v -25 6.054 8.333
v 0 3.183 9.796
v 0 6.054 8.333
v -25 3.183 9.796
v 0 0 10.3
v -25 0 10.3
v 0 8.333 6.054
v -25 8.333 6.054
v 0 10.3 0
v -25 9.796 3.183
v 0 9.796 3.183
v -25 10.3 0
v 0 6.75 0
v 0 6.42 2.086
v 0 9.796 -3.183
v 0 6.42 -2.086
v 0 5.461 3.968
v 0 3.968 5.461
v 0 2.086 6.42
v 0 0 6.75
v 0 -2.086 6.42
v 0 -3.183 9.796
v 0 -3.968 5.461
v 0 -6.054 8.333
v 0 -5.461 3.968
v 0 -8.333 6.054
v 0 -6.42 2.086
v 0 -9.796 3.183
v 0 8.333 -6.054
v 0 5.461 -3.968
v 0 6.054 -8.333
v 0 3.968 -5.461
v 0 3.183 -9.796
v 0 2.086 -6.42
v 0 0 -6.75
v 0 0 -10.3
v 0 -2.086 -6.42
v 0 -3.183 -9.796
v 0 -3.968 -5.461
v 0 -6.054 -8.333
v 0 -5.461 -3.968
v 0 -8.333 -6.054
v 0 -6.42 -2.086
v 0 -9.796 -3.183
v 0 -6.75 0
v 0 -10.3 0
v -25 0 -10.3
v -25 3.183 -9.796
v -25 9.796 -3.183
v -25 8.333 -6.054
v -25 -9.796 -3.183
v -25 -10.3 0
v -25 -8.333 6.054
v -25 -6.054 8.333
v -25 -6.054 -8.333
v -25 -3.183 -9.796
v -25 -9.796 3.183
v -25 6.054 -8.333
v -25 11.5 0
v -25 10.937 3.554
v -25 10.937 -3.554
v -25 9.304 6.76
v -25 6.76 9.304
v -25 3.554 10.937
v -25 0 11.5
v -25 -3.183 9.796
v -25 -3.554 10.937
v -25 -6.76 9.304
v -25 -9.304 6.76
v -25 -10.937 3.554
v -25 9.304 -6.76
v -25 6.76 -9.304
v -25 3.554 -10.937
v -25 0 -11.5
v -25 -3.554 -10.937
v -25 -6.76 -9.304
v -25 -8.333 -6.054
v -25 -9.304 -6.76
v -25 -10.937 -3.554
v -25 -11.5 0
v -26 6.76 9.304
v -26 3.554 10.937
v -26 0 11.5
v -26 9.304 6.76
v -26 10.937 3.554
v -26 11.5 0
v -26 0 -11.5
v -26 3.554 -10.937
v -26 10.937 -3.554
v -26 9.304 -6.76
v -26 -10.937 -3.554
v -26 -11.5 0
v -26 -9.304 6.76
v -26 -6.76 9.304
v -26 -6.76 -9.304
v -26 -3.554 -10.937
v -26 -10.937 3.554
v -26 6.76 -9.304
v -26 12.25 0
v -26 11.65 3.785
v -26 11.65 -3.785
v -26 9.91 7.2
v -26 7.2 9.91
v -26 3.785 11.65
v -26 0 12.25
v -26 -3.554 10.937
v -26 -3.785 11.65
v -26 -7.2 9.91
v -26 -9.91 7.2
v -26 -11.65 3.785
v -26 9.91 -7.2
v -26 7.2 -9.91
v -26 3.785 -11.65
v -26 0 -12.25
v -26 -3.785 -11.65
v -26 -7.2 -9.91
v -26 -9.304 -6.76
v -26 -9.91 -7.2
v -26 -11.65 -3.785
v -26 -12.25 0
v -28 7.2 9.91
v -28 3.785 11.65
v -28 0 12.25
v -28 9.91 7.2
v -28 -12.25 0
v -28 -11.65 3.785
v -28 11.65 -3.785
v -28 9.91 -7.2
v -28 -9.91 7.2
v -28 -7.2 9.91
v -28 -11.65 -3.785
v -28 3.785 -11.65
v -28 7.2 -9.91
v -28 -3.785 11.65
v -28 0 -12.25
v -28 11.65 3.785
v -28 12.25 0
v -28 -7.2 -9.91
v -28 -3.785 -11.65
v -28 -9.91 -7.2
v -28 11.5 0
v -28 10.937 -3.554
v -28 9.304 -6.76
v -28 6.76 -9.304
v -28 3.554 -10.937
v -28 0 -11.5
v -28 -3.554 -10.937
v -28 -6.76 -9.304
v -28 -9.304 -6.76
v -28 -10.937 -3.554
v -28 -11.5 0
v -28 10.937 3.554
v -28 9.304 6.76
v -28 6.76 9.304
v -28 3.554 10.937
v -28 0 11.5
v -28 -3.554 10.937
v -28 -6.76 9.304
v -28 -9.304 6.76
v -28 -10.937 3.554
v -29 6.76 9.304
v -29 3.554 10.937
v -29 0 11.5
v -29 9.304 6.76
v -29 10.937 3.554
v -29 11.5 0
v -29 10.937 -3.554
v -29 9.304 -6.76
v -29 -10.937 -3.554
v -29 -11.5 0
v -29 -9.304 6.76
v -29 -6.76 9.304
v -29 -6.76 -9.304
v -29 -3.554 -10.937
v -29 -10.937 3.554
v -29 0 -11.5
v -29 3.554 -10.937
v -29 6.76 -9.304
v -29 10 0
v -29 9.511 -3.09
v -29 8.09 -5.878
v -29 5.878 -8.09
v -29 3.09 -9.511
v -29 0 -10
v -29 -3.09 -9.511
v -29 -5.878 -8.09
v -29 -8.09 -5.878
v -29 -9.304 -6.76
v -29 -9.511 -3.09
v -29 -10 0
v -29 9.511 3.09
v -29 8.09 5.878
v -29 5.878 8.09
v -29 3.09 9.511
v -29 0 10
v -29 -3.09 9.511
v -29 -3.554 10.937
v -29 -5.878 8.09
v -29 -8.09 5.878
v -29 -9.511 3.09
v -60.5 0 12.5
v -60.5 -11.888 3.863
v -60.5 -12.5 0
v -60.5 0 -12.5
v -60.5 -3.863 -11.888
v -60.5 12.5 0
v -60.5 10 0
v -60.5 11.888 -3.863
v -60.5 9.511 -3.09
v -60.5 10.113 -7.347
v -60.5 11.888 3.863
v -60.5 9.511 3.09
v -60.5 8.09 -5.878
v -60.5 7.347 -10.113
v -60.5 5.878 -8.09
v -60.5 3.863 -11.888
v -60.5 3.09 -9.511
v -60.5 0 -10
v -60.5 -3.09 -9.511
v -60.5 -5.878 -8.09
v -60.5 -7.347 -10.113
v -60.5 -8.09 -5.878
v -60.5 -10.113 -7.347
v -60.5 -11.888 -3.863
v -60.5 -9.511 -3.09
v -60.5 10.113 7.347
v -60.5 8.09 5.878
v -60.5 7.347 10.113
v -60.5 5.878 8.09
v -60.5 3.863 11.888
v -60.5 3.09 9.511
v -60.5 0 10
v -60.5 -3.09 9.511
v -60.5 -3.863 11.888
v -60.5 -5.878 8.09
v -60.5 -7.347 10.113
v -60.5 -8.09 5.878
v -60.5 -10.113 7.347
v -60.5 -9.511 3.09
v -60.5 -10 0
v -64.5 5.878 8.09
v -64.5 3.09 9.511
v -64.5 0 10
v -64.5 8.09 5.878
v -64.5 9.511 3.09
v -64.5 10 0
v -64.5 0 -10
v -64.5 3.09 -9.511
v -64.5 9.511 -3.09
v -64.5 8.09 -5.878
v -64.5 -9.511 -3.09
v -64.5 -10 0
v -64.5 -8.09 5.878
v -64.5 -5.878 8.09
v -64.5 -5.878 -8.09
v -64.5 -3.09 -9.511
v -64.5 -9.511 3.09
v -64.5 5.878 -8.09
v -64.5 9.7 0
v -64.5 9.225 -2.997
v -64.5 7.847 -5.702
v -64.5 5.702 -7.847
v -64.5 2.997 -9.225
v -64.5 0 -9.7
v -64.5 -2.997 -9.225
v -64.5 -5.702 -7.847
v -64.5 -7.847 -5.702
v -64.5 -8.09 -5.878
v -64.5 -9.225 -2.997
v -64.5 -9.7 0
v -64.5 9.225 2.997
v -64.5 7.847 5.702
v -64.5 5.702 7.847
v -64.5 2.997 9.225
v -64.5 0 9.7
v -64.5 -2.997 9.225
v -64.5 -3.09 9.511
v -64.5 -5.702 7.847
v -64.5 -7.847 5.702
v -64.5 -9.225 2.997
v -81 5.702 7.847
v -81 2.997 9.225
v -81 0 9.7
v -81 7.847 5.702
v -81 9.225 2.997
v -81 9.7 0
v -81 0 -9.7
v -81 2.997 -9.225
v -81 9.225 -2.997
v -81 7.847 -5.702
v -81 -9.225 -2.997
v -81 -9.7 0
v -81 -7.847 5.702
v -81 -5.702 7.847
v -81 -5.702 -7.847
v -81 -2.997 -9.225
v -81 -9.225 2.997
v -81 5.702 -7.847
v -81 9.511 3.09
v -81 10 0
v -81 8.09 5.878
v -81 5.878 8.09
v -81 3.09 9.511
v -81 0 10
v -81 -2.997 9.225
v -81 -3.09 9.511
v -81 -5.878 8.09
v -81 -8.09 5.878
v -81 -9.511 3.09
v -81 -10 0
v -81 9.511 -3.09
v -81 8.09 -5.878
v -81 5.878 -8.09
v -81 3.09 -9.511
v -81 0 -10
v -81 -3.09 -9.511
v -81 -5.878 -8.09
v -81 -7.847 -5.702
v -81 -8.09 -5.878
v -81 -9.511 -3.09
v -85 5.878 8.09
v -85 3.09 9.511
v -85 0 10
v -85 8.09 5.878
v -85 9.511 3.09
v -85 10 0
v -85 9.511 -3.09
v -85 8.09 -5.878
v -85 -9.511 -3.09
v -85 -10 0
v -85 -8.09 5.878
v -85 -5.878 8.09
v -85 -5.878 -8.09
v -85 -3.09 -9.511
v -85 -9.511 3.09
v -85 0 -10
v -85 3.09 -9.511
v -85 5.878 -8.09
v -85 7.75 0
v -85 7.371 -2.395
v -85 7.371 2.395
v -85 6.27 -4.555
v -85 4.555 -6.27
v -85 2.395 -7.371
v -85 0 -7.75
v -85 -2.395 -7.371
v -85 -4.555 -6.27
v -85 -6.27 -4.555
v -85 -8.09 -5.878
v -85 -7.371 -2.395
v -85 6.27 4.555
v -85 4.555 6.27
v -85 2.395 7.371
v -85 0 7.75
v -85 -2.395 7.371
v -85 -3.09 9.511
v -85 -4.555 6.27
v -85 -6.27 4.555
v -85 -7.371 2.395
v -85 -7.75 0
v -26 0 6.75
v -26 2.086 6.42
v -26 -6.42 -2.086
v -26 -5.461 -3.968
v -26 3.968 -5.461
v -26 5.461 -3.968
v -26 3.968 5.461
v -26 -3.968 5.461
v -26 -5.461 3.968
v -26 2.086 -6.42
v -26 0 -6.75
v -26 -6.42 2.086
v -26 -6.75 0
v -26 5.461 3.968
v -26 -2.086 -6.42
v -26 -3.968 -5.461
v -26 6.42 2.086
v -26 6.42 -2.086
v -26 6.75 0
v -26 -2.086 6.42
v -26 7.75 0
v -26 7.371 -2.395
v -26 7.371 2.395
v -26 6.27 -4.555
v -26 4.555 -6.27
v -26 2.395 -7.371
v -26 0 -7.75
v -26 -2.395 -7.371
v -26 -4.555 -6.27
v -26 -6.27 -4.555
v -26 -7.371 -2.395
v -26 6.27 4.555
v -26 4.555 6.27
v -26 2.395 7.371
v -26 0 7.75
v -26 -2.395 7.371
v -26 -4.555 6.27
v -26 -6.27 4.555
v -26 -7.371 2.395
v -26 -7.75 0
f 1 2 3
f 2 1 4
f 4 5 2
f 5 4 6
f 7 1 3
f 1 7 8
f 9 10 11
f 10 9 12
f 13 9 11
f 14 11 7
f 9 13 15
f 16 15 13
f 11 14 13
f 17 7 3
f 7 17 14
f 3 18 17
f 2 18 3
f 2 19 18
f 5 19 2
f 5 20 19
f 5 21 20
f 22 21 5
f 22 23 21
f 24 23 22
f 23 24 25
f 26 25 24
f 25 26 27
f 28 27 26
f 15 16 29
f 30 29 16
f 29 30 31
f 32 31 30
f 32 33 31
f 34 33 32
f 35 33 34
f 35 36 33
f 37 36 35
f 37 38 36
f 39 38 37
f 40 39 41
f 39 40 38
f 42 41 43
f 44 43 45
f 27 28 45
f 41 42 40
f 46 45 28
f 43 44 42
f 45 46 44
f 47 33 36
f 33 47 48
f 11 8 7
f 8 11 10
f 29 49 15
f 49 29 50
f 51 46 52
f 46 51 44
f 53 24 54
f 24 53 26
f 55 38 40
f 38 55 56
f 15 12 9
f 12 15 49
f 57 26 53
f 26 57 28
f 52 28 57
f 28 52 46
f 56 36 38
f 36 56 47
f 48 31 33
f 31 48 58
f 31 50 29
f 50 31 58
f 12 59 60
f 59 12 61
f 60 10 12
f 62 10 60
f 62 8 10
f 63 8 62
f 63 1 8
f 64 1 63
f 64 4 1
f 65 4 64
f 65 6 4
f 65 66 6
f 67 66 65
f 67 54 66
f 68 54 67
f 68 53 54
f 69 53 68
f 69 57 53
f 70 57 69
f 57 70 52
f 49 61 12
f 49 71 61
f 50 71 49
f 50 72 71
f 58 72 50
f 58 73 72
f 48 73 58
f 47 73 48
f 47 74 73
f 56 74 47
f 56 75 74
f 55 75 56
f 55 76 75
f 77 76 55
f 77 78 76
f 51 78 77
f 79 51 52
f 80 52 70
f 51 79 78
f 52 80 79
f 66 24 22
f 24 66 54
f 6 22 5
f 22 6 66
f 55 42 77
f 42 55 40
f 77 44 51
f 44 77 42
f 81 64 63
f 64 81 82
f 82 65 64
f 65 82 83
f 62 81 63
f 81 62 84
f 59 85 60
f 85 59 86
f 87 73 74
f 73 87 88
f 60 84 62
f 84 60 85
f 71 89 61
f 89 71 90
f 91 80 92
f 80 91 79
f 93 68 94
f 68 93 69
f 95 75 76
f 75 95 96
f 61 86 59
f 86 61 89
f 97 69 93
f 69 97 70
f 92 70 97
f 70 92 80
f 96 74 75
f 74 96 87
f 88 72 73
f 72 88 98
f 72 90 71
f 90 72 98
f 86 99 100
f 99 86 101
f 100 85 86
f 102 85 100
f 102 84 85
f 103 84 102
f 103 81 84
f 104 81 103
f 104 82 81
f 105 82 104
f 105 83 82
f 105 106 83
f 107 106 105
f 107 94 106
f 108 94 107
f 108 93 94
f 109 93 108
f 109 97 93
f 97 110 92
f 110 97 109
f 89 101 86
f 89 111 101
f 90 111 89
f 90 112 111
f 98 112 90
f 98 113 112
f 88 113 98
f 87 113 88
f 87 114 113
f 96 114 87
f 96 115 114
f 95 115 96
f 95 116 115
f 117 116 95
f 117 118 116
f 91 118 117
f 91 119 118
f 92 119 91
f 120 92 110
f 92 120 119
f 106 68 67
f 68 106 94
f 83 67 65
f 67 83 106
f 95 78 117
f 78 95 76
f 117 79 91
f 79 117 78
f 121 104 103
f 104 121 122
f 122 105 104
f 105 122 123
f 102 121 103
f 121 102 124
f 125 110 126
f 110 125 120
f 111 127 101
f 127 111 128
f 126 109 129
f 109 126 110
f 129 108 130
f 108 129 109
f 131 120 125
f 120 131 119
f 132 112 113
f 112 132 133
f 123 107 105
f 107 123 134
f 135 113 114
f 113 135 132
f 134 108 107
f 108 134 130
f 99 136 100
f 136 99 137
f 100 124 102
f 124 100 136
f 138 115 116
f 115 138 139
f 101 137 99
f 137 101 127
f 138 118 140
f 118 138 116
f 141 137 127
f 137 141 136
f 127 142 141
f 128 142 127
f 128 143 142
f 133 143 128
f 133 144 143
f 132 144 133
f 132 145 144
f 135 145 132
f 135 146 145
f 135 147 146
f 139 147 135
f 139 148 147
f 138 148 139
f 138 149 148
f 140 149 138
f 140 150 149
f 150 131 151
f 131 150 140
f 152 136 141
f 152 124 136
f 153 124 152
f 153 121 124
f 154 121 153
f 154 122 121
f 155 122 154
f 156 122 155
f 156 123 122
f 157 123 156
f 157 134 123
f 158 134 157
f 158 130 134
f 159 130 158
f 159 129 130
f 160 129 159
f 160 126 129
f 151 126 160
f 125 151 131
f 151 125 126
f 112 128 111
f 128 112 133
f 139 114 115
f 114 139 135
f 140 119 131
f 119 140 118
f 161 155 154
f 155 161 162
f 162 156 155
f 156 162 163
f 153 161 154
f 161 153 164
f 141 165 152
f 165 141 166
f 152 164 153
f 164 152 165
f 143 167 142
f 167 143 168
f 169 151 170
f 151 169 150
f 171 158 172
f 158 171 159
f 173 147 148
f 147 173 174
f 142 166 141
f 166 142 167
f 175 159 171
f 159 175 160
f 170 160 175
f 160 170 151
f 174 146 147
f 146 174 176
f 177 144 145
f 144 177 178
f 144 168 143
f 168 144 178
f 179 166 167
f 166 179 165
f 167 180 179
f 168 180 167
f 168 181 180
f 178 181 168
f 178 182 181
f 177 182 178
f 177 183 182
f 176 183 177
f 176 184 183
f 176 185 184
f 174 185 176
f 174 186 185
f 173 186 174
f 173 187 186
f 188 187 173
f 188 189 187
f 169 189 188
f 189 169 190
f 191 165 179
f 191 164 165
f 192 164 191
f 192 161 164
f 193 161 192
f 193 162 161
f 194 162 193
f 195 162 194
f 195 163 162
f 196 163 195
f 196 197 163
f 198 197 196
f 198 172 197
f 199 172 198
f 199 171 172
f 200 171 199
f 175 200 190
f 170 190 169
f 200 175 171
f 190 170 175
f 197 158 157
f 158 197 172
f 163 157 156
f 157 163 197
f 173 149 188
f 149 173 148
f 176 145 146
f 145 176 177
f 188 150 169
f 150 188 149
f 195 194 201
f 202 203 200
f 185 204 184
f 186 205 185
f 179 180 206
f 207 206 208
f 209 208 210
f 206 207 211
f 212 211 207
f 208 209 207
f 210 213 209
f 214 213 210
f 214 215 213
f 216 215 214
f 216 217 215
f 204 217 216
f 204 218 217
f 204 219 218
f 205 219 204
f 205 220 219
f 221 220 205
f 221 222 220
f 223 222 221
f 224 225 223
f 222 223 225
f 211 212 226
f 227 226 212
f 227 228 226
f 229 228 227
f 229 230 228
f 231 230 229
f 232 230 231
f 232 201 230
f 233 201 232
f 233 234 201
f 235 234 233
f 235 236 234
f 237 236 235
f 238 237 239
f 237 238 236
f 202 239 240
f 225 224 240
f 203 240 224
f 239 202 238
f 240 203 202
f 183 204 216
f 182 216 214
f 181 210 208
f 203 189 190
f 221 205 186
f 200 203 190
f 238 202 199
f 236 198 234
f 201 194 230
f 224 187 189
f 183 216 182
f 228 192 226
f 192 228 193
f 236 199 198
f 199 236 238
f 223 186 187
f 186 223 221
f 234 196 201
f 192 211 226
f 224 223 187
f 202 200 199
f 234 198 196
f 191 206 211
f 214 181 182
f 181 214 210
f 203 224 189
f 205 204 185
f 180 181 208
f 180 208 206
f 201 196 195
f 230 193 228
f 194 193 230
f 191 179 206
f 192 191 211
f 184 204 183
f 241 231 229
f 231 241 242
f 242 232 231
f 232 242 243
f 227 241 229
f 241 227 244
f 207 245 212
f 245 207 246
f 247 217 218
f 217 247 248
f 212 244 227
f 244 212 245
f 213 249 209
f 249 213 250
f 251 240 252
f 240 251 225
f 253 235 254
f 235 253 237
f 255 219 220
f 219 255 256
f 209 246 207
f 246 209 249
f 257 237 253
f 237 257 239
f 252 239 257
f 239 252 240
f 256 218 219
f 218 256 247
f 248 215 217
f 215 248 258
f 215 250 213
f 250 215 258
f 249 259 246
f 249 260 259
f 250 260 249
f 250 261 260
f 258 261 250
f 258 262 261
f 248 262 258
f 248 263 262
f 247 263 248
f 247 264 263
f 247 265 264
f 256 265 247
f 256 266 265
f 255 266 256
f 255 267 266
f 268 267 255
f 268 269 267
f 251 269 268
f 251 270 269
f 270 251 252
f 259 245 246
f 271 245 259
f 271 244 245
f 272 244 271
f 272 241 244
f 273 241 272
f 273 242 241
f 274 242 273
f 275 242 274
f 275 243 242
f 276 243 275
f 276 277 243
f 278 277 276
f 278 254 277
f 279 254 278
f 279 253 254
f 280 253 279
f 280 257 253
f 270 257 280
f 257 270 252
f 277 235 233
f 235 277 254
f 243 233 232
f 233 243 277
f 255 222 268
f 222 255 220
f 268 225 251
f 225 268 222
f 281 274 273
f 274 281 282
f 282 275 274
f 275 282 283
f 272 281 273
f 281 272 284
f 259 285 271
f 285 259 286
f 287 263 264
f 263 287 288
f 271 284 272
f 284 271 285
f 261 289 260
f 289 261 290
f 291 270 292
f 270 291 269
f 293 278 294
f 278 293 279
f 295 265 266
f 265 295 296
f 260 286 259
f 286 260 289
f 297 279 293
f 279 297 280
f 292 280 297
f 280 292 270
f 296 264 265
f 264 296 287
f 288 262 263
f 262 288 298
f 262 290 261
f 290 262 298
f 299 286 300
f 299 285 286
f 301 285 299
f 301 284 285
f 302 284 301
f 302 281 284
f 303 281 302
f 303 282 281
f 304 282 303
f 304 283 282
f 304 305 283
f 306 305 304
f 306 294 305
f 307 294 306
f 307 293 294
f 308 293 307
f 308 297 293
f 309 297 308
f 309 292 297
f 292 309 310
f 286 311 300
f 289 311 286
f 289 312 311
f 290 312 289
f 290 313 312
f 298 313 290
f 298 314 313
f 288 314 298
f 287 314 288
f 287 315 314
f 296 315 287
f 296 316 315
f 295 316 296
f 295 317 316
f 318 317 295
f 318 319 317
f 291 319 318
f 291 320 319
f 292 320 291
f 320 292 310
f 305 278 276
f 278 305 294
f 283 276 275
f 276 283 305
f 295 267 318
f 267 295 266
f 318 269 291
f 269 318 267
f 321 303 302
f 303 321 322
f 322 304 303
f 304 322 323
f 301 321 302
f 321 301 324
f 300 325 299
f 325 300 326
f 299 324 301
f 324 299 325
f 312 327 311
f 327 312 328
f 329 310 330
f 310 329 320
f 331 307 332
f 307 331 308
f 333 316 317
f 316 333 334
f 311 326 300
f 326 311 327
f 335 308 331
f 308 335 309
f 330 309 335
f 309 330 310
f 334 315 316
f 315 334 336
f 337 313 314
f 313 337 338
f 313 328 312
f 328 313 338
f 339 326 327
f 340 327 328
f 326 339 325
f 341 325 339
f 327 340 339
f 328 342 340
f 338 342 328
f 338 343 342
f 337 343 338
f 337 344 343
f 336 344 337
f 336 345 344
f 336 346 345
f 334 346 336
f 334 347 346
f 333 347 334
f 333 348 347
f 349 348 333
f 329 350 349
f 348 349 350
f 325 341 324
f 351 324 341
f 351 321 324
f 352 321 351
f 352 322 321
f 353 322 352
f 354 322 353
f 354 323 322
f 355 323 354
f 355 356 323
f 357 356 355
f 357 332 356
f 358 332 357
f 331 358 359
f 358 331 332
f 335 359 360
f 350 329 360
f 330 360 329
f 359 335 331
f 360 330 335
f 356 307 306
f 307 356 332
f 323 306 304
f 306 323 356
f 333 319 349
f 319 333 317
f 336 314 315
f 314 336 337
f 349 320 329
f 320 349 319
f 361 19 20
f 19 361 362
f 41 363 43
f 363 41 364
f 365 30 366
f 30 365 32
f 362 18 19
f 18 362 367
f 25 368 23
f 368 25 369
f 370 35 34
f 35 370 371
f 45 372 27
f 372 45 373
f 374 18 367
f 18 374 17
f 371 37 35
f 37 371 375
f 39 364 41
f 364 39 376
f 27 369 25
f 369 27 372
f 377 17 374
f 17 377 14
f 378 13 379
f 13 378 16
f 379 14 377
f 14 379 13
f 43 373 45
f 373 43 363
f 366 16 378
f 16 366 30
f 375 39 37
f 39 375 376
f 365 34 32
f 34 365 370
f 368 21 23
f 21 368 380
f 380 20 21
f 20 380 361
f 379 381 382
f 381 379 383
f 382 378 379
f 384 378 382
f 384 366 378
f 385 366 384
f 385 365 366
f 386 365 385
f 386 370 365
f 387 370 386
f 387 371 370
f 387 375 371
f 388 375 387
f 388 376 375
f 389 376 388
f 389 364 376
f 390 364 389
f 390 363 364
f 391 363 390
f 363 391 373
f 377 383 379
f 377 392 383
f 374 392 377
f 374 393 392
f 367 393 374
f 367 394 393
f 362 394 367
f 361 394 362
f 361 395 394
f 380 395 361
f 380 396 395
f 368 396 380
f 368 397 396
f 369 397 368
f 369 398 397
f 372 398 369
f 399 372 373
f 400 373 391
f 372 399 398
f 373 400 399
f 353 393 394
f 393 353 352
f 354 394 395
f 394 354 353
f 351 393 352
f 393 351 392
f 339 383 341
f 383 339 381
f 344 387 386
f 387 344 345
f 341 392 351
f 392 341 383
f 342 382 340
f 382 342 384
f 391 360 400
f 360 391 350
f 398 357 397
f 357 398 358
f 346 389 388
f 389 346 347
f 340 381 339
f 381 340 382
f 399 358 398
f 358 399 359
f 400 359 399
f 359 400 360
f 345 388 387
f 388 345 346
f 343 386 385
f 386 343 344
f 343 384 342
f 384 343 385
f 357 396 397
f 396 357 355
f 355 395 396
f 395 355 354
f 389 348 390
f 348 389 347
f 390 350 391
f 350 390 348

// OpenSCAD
// openNSP_project, chanter split stock version 1.0
// Zexuan Qiao, 2025
// under GPL license ver3

stockLOA = 85; //.1

ferruleWood = 25; //.1
ferruleWoodDiameter = 20.6; //.1

decoration1 = 1; //.1
decoration2 = 2; //.1
decoration3 = 1; //.1
decoration1Diameter = 23; //.1
decoration2Diameter = 24.5; //.1
decoration3Diameter = 23; //.1

mainDiameter1 = 20; //.1
mainDiameter2 = 25; //.1

groove = 16.5; //.1
grooveDiameter = 19.4; //.1
bagTenonDiameter = 20; //.1
grooveOffset = 4; //.1

bagEnd = 24.5; //.1

boreDiameter1 = 15.5; //.1
tenon = 26; //.1
boreDiameter2 = 13.5; //.1

main = stockLOA-ferruleWood-decoration1-decoration2-decoration3-bagEnd; //.1

/* [Utilities] */
// Segments, the higher the value, the smoother the surface would be.
$fn = 20;

rotate([0,-90,0]) difference(){
union(){
cylinder(h = ferruleWood, d = ferruleWoodDiameter);
translate([0,0,ferruleWood]) cylinder(h = decoration1, d = decoration1Diameter);
translate([0,0,ferruleWood+decoration1]) cylinder(h = decoration2, d = decoration2Diameter);
translate([0,0,ferruleWood+decoration1+decoration2])cylinder(h = decoration3, d = decoration3Diameter);
translate([0,0,ferruleWood+decoration1+decoration2+decoration3]) cylinder(h = main, d1 = mainDiameter1, d2 = mainDiameter2);

translate([0,0,ferruleWood+decoration1+decoration2+decoration3+main]) cylinder(h = bagEnd-grooveOffset-groove, d = bagTenonDiameter);
translate([0,0,ferruleWood+decoration1+decoration2+decoration3+main+bagEnd-grooveOffset-groove]) cylinder(h = groove, d = grooveDiameter);
translate([0,0,ferruleWood+decoration1+decoration2+decoration3+main+bagEnd-grooveOffset]) cylinder(h = grooveOffset, d = bagTenonDiameter);

}
translate([0,0,0]) cylinder(h = tenon, d = boreDiameter2);
translate([0,0,tenon]) cylinder(h = stockLOA-tenon, d = boreDiameter1);
}
